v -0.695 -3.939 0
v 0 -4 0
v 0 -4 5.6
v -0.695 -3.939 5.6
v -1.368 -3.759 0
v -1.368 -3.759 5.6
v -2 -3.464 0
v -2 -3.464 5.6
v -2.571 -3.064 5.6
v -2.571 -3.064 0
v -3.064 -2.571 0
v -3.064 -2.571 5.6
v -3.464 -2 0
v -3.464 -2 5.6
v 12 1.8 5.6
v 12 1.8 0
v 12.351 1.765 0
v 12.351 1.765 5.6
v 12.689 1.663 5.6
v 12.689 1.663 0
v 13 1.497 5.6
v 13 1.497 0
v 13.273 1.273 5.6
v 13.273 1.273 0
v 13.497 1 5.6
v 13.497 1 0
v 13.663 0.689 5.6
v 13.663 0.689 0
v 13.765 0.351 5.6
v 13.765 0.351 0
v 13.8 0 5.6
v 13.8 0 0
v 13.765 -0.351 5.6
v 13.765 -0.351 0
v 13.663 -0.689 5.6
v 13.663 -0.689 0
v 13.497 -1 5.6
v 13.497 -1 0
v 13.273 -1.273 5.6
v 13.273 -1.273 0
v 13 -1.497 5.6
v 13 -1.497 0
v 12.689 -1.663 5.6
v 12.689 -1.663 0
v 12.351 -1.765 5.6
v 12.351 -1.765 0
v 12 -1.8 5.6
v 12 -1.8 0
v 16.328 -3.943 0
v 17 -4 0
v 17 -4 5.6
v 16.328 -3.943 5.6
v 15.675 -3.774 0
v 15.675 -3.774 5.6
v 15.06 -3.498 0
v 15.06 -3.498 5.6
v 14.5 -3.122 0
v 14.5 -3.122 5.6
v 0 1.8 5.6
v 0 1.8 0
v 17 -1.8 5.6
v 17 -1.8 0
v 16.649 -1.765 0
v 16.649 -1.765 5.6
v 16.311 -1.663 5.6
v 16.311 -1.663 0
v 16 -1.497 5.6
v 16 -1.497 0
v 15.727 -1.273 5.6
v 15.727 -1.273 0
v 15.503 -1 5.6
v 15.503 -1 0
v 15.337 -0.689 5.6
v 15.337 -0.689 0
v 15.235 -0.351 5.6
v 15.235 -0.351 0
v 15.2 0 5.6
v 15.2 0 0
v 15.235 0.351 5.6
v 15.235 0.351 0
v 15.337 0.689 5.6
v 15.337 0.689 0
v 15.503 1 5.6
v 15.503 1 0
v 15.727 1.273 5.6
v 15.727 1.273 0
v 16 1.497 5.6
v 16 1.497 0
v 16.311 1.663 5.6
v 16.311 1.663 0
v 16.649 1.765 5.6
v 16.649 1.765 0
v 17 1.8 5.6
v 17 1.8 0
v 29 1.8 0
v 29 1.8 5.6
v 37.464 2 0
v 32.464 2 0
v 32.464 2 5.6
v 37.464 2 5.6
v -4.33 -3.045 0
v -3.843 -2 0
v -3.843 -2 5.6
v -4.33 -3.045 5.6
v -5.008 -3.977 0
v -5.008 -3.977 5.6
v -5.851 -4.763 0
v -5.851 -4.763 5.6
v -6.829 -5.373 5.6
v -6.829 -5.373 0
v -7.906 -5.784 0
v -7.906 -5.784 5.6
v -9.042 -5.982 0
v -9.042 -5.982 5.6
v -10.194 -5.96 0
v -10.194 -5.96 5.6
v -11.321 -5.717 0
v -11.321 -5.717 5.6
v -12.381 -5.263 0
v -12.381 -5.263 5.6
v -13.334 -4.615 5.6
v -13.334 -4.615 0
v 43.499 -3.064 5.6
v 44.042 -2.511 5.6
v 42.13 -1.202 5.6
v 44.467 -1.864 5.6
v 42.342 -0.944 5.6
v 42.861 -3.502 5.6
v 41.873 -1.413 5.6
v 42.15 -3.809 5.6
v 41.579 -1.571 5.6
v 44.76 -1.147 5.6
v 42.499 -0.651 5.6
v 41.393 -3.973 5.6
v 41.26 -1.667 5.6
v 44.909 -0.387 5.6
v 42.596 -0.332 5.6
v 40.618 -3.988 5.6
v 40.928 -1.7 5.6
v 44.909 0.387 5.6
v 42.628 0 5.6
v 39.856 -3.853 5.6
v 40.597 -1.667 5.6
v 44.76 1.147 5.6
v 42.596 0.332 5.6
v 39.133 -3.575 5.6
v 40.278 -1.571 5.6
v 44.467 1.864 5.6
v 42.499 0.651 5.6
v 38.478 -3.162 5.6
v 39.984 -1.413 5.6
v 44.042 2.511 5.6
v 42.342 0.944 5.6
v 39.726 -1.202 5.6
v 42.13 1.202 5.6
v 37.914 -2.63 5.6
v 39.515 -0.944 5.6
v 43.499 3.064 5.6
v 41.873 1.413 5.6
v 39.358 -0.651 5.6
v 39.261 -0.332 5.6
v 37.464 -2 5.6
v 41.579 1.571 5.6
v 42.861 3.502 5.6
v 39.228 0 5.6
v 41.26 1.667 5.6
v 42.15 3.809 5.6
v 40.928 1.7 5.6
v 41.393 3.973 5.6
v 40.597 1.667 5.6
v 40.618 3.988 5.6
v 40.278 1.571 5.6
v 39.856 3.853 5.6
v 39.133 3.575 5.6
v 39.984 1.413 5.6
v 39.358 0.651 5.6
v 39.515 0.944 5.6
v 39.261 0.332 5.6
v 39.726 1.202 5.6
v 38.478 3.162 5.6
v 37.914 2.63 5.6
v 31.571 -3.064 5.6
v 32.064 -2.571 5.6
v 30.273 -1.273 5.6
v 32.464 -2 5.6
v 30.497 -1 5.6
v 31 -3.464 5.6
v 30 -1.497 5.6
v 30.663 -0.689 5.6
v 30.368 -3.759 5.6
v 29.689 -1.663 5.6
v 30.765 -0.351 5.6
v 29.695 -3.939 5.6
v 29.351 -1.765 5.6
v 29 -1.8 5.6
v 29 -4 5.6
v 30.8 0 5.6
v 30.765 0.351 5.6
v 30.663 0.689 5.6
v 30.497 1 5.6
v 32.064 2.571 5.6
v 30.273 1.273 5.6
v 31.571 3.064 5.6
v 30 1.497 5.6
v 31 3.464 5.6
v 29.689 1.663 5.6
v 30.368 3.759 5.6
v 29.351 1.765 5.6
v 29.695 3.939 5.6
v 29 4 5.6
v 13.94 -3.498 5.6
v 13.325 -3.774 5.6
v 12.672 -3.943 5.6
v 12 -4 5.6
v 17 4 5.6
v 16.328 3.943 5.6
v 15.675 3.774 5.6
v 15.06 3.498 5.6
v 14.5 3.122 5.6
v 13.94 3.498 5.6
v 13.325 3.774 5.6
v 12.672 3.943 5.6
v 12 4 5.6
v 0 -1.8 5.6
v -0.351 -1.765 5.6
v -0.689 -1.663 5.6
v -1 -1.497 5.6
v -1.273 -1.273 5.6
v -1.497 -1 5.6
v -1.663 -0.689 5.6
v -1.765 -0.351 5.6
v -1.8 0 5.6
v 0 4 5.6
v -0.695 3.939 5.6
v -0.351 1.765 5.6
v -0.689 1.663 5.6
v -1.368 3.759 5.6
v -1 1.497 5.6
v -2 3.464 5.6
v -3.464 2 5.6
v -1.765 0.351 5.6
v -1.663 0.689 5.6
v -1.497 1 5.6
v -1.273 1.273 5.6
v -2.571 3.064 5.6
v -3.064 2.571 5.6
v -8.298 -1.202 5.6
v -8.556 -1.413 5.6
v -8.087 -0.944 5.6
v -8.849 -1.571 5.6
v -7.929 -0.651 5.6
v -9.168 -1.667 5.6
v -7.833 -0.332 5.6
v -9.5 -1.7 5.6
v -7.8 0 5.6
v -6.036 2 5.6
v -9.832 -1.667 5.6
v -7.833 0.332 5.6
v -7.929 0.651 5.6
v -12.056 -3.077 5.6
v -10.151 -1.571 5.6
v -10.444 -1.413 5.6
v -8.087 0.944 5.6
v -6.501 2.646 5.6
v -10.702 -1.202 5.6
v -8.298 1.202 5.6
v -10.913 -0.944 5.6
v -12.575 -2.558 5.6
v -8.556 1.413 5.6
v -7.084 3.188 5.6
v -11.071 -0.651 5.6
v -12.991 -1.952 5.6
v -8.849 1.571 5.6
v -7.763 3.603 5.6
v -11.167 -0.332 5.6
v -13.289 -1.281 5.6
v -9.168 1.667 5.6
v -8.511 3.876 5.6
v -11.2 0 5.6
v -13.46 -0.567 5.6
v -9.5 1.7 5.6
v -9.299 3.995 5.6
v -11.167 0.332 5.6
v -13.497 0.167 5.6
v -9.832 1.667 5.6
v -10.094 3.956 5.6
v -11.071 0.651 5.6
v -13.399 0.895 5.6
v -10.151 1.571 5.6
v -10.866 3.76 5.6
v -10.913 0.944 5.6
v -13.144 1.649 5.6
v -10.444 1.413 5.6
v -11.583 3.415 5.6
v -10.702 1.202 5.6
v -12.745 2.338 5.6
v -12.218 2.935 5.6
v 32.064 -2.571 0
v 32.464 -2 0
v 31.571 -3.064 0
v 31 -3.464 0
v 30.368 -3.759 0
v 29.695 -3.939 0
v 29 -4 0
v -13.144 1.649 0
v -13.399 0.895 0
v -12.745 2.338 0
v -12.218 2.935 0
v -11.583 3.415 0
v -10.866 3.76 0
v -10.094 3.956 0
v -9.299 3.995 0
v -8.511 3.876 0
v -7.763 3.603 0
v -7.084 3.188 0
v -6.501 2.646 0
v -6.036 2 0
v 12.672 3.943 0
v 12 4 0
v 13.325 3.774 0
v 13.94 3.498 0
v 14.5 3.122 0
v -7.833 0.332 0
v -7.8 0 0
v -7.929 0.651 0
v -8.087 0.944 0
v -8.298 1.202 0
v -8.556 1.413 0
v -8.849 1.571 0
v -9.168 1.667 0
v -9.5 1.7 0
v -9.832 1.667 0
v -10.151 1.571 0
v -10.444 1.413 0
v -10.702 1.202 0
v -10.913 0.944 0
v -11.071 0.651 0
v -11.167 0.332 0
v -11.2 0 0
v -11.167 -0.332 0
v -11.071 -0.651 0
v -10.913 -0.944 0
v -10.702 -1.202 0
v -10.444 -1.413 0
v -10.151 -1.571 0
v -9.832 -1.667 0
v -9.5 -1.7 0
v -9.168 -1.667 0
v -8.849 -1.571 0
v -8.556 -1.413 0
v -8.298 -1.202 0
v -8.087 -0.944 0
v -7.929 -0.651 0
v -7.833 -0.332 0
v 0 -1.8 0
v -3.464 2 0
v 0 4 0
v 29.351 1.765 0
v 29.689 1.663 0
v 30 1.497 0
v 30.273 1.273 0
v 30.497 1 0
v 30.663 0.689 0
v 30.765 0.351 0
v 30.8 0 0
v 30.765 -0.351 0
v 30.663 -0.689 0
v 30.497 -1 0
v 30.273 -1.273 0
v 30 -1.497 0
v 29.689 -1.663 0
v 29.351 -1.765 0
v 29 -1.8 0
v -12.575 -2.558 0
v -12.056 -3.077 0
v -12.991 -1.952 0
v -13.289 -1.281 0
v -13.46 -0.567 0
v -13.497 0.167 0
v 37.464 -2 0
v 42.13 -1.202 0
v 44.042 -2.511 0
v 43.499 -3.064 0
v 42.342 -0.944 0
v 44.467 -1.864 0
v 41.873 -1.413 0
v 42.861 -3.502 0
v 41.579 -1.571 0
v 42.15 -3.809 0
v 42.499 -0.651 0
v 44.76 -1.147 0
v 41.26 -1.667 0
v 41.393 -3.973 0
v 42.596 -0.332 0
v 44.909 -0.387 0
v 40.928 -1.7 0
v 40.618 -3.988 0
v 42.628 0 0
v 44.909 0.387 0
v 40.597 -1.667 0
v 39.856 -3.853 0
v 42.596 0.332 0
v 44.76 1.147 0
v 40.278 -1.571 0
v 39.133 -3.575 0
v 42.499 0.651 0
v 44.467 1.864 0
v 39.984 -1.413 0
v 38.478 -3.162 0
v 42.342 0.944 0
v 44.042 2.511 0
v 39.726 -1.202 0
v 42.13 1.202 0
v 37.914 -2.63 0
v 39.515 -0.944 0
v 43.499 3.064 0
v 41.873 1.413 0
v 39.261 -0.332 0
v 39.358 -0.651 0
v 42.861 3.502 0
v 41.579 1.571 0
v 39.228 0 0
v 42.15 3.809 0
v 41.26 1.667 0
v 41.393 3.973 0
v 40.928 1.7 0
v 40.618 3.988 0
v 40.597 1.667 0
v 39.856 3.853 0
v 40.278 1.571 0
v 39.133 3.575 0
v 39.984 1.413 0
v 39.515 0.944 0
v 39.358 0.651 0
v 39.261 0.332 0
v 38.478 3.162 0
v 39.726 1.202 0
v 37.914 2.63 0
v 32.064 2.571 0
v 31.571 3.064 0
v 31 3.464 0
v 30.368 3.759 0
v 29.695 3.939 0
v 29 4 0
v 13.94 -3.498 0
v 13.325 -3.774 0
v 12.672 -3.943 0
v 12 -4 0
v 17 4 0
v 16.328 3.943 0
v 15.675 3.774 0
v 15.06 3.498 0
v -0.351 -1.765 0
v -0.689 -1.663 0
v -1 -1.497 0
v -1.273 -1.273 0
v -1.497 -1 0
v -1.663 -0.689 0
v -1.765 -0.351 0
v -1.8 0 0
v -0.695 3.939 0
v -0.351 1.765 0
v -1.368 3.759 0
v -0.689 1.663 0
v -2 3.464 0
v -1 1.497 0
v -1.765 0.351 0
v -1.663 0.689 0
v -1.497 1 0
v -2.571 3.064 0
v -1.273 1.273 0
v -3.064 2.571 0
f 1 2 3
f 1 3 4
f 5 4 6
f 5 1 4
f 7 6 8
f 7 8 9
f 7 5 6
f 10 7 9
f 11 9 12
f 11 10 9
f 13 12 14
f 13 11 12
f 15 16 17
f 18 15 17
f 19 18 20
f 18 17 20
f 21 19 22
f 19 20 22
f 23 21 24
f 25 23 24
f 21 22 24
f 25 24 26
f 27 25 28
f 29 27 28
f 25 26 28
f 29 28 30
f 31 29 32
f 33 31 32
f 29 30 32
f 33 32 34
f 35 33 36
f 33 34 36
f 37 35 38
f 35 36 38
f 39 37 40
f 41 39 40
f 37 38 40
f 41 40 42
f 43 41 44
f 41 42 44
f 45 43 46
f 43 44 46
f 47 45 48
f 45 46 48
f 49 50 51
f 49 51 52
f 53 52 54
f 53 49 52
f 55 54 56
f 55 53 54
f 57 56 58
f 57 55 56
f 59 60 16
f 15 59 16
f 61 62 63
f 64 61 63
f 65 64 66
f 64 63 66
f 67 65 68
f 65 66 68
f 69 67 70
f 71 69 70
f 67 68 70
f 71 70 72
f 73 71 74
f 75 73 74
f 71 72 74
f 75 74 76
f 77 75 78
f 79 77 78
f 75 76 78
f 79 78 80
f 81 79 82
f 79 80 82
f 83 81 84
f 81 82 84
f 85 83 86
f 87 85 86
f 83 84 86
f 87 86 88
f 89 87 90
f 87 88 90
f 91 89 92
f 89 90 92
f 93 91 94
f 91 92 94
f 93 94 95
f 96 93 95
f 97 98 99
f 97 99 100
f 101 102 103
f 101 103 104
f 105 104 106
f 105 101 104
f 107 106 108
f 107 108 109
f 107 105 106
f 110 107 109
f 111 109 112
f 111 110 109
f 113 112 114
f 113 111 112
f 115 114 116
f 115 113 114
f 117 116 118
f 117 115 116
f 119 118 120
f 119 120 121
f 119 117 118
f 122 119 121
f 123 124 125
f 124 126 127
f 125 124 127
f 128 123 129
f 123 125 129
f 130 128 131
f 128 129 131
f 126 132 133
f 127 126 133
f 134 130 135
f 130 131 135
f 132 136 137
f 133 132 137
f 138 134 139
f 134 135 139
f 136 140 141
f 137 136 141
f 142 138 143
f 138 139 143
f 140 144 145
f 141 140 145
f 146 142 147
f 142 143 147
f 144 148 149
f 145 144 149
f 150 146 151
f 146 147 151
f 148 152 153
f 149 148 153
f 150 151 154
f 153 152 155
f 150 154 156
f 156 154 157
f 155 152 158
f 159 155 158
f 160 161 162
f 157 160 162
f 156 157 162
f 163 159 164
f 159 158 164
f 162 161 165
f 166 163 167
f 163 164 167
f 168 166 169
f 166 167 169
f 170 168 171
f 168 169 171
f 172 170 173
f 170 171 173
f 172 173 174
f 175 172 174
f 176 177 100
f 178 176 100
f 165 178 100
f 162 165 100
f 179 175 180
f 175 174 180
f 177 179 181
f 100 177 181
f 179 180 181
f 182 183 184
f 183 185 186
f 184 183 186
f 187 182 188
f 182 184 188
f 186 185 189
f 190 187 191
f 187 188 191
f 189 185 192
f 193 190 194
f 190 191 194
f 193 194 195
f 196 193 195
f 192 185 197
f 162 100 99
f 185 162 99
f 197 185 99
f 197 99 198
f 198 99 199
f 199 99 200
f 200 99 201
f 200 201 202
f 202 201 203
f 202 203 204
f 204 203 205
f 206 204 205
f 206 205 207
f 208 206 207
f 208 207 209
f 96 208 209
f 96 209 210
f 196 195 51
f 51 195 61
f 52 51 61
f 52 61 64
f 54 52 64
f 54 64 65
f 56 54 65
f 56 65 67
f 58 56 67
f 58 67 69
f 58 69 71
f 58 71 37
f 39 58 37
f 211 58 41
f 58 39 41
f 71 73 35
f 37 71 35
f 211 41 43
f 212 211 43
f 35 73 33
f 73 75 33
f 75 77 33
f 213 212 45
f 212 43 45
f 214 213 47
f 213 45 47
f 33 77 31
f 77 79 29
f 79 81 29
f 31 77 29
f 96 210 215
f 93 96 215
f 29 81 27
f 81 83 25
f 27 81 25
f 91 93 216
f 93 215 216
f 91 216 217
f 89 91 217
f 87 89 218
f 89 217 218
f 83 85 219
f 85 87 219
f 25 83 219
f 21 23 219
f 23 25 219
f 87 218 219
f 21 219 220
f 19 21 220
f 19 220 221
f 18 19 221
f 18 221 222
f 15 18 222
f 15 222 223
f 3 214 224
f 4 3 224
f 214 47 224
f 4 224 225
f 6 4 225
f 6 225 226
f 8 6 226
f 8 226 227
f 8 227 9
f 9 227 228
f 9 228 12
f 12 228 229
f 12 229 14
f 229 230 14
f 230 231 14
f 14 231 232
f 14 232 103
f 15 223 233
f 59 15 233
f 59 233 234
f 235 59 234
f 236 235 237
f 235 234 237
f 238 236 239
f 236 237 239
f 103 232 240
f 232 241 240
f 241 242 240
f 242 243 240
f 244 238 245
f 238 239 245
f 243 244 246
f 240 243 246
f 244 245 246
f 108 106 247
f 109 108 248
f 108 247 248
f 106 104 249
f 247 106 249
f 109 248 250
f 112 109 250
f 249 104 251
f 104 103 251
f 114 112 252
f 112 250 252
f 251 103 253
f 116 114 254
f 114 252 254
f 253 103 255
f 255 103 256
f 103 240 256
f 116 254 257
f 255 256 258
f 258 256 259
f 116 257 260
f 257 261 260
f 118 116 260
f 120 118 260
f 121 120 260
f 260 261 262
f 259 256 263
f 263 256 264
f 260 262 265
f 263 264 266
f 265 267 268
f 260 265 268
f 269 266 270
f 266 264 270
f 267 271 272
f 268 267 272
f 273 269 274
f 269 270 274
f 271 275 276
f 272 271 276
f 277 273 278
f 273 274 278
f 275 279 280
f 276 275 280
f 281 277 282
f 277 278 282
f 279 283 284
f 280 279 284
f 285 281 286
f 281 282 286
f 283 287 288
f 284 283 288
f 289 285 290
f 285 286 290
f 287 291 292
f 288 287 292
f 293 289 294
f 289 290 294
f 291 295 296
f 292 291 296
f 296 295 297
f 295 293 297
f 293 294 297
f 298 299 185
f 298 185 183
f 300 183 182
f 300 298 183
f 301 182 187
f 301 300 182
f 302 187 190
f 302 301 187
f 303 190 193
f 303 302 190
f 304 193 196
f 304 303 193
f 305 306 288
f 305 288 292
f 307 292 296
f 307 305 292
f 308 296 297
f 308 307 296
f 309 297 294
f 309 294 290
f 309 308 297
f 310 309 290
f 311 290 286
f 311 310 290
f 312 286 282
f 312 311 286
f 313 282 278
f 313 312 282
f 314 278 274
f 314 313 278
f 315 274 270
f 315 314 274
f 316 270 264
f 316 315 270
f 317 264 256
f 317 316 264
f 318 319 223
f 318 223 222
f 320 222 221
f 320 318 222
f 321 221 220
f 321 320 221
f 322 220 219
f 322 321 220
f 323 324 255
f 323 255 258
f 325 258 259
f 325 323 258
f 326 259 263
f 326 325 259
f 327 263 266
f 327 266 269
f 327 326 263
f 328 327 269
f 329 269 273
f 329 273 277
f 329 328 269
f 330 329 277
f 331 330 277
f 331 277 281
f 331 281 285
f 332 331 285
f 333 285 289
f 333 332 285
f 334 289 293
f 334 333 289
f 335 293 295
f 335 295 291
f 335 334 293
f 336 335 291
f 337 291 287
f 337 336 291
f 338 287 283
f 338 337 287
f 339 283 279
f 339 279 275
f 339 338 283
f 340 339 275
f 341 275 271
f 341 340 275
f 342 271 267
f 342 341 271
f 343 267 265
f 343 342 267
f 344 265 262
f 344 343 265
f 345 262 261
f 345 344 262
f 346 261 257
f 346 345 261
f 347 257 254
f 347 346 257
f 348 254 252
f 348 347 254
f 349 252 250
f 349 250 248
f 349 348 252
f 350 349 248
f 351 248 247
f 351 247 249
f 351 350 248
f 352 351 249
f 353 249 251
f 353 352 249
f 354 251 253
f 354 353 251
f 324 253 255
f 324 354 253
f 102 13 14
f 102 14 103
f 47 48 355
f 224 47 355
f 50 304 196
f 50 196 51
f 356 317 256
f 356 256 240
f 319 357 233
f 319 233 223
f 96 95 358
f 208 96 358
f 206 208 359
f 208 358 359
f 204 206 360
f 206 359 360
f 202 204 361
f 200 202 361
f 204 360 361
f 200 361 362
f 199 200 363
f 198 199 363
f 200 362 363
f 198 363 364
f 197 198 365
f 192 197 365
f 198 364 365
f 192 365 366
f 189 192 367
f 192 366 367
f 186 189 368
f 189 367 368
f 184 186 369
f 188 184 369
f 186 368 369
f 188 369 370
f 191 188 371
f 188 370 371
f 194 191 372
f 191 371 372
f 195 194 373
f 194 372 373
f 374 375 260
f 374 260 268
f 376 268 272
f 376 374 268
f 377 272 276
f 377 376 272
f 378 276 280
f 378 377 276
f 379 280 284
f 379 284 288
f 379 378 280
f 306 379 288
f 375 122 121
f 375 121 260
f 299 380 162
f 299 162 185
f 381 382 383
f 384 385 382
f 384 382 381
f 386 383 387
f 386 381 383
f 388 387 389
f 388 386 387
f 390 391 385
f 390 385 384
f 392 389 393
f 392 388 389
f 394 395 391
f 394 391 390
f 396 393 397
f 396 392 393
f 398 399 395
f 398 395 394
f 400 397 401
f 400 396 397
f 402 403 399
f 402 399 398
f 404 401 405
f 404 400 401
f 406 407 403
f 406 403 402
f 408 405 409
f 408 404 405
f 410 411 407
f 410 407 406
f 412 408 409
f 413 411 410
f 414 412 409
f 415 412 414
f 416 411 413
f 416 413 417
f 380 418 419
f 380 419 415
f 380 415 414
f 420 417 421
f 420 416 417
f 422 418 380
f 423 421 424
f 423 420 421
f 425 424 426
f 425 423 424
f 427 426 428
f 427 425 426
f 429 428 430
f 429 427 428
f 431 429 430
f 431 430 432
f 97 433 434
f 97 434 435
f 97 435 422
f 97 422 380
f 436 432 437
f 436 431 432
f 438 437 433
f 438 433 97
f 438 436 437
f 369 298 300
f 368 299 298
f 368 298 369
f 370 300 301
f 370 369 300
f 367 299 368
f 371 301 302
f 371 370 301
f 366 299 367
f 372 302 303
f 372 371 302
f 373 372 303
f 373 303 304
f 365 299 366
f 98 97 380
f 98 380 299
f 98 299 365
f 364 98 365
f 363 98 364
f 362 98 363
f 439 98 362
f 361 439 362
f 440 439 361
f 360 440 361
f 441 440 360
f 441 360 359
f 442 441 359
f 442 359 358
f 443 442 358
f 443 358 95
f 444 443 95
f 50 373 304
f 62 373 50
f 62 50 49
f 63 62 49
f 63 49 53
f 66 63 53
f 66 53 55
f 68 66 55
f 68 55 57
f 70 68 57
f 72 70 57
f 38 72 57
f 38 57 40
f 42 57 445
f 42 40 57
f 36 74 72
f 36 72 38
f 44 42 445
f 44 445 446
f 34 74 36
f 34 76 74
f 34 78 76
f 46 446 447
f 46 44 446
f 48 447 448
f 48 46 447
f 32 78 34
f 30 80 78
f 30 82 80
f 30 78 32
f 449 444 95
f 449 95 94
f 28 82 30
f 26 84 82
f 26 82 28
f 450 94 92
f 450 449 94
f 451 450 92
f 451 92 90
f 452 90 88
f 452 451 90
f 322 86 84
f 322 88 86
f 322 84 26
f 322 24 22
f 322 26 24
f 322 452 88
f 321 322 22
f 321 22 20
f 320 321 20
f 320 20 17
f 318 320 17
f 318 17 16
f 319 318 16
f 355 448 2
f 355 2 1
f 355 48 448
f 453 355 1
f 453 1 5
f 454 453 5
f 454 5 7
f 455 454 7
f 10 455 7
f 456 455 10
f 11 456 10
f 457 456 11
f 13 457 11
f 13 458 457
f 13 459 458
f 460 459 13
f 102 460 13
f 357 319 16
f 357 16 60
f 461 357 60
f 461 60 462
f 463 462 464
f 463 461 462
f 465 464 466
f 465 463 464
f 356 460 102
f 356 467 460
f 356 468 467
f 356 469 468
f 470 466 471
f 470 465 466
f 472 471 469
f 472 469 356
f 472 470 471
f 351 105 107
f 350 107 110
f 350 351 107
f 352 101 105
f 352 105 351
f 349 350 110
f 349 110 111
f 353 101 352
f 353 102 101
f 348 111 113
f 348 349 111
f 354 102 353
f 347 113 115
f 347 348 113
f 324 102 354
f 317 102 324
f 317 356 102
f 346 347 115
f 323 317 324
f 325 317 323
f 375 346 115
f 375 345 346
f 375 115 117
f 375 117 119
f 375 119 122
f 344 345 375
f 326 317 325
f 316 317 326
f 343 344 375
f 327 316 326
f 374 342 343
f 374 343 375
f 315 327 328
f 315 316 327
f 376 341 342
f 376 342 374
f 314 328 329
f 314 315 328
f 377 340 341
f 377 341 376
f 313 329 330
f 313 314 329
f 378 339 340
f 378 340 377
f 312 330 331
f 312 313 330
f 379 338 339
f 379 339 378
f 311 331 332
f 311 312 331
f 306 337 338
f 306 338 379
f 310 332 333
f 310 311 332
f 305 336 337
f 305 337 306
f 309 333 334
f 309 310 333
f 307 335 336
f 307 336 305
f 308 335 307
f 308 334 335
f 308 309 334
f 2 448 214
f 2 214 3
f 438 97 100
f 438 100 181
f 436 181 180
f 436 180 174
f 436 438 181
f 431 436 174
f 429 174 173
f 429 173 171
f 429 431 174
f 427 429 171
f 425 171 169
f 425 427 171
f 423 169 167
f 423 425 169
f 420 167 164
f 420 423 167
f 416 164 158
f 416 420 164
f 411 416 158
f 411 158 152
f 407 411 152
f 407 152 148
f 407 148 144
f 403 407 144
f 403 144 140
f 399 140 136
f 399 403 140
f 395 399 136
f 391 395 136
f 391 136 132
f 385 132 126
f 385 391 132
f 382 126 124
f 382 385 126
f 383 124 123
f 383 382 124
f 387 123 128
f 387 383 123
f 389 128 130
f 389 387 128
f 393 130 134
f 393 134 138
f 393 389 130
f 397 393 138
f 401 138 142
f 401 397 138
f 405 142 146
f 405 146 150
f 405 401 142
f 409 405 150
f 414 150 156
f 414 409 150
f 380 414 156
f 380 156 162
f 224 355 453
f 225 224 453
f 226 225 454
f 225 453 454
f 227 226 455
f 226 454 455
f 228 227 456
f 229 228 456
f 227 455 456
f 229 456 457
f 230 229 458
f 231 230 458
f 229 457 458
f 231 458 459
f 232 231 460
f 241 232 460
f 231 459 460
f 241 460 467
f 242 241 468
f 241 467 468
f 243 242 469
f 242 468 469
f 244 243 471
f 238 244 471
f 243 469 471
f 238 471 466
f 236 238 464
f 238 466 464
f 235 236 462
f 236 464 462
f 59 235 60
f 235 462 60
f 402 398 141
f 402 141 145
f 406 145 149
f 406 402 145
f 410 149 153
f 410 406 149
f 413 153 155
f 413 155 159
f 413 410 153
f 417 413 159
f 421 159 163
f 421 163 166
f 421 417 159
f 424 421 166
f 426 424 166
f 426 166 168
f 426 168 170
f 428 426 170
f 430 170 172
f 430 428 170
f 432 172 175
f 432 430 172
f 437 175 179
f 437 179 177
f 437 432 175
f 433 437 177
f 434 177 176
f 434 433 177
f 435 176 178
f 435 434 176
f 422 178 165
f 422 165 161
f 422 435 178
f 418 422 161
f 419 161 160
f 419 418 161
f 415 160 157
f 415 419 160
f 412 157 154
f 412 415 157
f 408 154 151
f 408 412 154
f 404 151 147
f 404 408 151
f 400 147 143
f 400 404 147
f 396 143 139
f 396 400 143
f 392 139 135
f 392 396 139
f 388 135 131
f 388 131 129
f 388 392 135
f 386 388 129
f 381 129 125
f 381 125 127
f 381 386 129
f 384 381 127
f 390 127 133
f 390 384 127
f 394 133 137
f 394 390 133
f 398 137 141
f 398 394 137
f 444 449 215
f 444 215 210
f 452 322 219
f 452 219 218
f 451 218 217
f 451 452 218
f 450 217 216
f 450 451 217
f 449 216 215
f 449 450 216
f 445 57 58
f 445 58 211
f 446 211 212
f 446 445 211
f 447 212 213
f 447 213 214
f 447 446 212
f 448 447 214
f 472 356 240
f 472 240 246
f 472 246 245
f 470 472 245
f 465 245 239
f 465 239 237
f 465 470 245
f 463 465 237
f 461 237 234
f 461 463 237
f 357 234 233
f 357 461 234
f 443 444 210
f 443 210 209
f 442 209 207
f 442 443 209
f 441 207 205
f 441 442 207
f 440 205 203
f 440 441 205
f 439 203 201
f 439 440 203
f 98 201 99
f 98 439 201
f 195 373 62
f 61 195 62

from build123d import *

# Parameters (mm, degrees)
SKETCH_1_R      = 1.7
EXTRUDE_1_DEPTH = 5.6


with BuildPart() as part:
    # Эскиз1 → Бобышка-Вытянуть1 (new body)
    with BuildSketch(Plane.XY):
        with BuildLine():
            Line((0, 4), (12, 4))
            ThreePointArc((12, 4), (13.324764885, 3.774254628), (14.5, 3.122498999))
            ThreePointArc((14.5, 3.122498999), (15.675235115, 3.774254628), (17, 4))
            Line((17, 4), (29, 4))
            ThreePointArc((29, 4), (31, 3.464101615), (32.464101615, 2))
            Line((32.464101615, 2), (37.464101615, 2))
            ThreePointArc((37.464101615, 2), (44.92820323, 0), (37.464101615, -2))
            Line((37.464101615, -2), (32.464101615, -2))
            ThreePointArc((32.464101615, -2), (31, -3.464101615), (29, -4))
            Line((29, -4), (17, -4))
            ThreePointArc((17, -4), (15.675235115, -3.774254628), (14.5, -3.122498999))
            ThreePointArc((14.5, -3.122498999), (13.324764885, -3.774254628), (12, -4))
            Line((12, -4), (0, -4))
            ThreePointArc((0, -4), (-2, -3.464101615), (-3.464101615, -2))
            Line((-3.464101615, -2), (-3.843145751, -2))
            ThreePointArc((-3.843145751, -2), (-7.906039139, -5.784400468), (-13.333929304, -4.615299133))
            Line((-13.333929304, -4.615299133), (-12.05595287, -3.076866089))
            ThreePointArc((-12.05595287, -3.076866089), (-13.289295027, -1.281110144), (-13.398667792, 0.894644872))
            ThreePointArc((-13.398667792, 0.894644872), (-10.093855563, 3.955671317), (-6.035898385, 2))
            Line((-6.035898385, 2), (-3.843145751, 2))
            Line((-3.843145751, 2), (-3.464101615, 2))
            ThreePointArc((-3.464101615, 2), (-2, 3.464101615), (0, 4))
        make_face()
        with Locations((40.92820323, 0)):
            Circle(SKETCH_1_R, mode=Mode.SUBTRACT)
        with Locations((-9.5, 0)):
            Circle(SKETCH_1_R, mode=Mode.SUBTRACT)
        with BuildLine():
            Line((0, 1.8), (12, 1.8))
            ThreePointArc((12, 1.8), (13.8, 0), (12, -1.8))
            Line((12, -1.8), (0, -1.8))
            ThreePointArc((0, -1.8), (-1.8, 0), (0, 1.8))
        make_face(mode=Mode.SUBTRACT)
        with BuildLine():
            Line((17, 1.8), (29, 1.8))
            ThreePointArc((29, 1.8), (30.8, 0), (29, -1.8))
            Line((29, -1.8), (17, -1.8))
            ThreePointArc((17, -1.8), (15.2, 0), (17, 1.8))
        make_face(mode=Mode.SUBTRACT)
    extrude(amount=EXTRUDE_1_DEPTH)


solid = part.part
